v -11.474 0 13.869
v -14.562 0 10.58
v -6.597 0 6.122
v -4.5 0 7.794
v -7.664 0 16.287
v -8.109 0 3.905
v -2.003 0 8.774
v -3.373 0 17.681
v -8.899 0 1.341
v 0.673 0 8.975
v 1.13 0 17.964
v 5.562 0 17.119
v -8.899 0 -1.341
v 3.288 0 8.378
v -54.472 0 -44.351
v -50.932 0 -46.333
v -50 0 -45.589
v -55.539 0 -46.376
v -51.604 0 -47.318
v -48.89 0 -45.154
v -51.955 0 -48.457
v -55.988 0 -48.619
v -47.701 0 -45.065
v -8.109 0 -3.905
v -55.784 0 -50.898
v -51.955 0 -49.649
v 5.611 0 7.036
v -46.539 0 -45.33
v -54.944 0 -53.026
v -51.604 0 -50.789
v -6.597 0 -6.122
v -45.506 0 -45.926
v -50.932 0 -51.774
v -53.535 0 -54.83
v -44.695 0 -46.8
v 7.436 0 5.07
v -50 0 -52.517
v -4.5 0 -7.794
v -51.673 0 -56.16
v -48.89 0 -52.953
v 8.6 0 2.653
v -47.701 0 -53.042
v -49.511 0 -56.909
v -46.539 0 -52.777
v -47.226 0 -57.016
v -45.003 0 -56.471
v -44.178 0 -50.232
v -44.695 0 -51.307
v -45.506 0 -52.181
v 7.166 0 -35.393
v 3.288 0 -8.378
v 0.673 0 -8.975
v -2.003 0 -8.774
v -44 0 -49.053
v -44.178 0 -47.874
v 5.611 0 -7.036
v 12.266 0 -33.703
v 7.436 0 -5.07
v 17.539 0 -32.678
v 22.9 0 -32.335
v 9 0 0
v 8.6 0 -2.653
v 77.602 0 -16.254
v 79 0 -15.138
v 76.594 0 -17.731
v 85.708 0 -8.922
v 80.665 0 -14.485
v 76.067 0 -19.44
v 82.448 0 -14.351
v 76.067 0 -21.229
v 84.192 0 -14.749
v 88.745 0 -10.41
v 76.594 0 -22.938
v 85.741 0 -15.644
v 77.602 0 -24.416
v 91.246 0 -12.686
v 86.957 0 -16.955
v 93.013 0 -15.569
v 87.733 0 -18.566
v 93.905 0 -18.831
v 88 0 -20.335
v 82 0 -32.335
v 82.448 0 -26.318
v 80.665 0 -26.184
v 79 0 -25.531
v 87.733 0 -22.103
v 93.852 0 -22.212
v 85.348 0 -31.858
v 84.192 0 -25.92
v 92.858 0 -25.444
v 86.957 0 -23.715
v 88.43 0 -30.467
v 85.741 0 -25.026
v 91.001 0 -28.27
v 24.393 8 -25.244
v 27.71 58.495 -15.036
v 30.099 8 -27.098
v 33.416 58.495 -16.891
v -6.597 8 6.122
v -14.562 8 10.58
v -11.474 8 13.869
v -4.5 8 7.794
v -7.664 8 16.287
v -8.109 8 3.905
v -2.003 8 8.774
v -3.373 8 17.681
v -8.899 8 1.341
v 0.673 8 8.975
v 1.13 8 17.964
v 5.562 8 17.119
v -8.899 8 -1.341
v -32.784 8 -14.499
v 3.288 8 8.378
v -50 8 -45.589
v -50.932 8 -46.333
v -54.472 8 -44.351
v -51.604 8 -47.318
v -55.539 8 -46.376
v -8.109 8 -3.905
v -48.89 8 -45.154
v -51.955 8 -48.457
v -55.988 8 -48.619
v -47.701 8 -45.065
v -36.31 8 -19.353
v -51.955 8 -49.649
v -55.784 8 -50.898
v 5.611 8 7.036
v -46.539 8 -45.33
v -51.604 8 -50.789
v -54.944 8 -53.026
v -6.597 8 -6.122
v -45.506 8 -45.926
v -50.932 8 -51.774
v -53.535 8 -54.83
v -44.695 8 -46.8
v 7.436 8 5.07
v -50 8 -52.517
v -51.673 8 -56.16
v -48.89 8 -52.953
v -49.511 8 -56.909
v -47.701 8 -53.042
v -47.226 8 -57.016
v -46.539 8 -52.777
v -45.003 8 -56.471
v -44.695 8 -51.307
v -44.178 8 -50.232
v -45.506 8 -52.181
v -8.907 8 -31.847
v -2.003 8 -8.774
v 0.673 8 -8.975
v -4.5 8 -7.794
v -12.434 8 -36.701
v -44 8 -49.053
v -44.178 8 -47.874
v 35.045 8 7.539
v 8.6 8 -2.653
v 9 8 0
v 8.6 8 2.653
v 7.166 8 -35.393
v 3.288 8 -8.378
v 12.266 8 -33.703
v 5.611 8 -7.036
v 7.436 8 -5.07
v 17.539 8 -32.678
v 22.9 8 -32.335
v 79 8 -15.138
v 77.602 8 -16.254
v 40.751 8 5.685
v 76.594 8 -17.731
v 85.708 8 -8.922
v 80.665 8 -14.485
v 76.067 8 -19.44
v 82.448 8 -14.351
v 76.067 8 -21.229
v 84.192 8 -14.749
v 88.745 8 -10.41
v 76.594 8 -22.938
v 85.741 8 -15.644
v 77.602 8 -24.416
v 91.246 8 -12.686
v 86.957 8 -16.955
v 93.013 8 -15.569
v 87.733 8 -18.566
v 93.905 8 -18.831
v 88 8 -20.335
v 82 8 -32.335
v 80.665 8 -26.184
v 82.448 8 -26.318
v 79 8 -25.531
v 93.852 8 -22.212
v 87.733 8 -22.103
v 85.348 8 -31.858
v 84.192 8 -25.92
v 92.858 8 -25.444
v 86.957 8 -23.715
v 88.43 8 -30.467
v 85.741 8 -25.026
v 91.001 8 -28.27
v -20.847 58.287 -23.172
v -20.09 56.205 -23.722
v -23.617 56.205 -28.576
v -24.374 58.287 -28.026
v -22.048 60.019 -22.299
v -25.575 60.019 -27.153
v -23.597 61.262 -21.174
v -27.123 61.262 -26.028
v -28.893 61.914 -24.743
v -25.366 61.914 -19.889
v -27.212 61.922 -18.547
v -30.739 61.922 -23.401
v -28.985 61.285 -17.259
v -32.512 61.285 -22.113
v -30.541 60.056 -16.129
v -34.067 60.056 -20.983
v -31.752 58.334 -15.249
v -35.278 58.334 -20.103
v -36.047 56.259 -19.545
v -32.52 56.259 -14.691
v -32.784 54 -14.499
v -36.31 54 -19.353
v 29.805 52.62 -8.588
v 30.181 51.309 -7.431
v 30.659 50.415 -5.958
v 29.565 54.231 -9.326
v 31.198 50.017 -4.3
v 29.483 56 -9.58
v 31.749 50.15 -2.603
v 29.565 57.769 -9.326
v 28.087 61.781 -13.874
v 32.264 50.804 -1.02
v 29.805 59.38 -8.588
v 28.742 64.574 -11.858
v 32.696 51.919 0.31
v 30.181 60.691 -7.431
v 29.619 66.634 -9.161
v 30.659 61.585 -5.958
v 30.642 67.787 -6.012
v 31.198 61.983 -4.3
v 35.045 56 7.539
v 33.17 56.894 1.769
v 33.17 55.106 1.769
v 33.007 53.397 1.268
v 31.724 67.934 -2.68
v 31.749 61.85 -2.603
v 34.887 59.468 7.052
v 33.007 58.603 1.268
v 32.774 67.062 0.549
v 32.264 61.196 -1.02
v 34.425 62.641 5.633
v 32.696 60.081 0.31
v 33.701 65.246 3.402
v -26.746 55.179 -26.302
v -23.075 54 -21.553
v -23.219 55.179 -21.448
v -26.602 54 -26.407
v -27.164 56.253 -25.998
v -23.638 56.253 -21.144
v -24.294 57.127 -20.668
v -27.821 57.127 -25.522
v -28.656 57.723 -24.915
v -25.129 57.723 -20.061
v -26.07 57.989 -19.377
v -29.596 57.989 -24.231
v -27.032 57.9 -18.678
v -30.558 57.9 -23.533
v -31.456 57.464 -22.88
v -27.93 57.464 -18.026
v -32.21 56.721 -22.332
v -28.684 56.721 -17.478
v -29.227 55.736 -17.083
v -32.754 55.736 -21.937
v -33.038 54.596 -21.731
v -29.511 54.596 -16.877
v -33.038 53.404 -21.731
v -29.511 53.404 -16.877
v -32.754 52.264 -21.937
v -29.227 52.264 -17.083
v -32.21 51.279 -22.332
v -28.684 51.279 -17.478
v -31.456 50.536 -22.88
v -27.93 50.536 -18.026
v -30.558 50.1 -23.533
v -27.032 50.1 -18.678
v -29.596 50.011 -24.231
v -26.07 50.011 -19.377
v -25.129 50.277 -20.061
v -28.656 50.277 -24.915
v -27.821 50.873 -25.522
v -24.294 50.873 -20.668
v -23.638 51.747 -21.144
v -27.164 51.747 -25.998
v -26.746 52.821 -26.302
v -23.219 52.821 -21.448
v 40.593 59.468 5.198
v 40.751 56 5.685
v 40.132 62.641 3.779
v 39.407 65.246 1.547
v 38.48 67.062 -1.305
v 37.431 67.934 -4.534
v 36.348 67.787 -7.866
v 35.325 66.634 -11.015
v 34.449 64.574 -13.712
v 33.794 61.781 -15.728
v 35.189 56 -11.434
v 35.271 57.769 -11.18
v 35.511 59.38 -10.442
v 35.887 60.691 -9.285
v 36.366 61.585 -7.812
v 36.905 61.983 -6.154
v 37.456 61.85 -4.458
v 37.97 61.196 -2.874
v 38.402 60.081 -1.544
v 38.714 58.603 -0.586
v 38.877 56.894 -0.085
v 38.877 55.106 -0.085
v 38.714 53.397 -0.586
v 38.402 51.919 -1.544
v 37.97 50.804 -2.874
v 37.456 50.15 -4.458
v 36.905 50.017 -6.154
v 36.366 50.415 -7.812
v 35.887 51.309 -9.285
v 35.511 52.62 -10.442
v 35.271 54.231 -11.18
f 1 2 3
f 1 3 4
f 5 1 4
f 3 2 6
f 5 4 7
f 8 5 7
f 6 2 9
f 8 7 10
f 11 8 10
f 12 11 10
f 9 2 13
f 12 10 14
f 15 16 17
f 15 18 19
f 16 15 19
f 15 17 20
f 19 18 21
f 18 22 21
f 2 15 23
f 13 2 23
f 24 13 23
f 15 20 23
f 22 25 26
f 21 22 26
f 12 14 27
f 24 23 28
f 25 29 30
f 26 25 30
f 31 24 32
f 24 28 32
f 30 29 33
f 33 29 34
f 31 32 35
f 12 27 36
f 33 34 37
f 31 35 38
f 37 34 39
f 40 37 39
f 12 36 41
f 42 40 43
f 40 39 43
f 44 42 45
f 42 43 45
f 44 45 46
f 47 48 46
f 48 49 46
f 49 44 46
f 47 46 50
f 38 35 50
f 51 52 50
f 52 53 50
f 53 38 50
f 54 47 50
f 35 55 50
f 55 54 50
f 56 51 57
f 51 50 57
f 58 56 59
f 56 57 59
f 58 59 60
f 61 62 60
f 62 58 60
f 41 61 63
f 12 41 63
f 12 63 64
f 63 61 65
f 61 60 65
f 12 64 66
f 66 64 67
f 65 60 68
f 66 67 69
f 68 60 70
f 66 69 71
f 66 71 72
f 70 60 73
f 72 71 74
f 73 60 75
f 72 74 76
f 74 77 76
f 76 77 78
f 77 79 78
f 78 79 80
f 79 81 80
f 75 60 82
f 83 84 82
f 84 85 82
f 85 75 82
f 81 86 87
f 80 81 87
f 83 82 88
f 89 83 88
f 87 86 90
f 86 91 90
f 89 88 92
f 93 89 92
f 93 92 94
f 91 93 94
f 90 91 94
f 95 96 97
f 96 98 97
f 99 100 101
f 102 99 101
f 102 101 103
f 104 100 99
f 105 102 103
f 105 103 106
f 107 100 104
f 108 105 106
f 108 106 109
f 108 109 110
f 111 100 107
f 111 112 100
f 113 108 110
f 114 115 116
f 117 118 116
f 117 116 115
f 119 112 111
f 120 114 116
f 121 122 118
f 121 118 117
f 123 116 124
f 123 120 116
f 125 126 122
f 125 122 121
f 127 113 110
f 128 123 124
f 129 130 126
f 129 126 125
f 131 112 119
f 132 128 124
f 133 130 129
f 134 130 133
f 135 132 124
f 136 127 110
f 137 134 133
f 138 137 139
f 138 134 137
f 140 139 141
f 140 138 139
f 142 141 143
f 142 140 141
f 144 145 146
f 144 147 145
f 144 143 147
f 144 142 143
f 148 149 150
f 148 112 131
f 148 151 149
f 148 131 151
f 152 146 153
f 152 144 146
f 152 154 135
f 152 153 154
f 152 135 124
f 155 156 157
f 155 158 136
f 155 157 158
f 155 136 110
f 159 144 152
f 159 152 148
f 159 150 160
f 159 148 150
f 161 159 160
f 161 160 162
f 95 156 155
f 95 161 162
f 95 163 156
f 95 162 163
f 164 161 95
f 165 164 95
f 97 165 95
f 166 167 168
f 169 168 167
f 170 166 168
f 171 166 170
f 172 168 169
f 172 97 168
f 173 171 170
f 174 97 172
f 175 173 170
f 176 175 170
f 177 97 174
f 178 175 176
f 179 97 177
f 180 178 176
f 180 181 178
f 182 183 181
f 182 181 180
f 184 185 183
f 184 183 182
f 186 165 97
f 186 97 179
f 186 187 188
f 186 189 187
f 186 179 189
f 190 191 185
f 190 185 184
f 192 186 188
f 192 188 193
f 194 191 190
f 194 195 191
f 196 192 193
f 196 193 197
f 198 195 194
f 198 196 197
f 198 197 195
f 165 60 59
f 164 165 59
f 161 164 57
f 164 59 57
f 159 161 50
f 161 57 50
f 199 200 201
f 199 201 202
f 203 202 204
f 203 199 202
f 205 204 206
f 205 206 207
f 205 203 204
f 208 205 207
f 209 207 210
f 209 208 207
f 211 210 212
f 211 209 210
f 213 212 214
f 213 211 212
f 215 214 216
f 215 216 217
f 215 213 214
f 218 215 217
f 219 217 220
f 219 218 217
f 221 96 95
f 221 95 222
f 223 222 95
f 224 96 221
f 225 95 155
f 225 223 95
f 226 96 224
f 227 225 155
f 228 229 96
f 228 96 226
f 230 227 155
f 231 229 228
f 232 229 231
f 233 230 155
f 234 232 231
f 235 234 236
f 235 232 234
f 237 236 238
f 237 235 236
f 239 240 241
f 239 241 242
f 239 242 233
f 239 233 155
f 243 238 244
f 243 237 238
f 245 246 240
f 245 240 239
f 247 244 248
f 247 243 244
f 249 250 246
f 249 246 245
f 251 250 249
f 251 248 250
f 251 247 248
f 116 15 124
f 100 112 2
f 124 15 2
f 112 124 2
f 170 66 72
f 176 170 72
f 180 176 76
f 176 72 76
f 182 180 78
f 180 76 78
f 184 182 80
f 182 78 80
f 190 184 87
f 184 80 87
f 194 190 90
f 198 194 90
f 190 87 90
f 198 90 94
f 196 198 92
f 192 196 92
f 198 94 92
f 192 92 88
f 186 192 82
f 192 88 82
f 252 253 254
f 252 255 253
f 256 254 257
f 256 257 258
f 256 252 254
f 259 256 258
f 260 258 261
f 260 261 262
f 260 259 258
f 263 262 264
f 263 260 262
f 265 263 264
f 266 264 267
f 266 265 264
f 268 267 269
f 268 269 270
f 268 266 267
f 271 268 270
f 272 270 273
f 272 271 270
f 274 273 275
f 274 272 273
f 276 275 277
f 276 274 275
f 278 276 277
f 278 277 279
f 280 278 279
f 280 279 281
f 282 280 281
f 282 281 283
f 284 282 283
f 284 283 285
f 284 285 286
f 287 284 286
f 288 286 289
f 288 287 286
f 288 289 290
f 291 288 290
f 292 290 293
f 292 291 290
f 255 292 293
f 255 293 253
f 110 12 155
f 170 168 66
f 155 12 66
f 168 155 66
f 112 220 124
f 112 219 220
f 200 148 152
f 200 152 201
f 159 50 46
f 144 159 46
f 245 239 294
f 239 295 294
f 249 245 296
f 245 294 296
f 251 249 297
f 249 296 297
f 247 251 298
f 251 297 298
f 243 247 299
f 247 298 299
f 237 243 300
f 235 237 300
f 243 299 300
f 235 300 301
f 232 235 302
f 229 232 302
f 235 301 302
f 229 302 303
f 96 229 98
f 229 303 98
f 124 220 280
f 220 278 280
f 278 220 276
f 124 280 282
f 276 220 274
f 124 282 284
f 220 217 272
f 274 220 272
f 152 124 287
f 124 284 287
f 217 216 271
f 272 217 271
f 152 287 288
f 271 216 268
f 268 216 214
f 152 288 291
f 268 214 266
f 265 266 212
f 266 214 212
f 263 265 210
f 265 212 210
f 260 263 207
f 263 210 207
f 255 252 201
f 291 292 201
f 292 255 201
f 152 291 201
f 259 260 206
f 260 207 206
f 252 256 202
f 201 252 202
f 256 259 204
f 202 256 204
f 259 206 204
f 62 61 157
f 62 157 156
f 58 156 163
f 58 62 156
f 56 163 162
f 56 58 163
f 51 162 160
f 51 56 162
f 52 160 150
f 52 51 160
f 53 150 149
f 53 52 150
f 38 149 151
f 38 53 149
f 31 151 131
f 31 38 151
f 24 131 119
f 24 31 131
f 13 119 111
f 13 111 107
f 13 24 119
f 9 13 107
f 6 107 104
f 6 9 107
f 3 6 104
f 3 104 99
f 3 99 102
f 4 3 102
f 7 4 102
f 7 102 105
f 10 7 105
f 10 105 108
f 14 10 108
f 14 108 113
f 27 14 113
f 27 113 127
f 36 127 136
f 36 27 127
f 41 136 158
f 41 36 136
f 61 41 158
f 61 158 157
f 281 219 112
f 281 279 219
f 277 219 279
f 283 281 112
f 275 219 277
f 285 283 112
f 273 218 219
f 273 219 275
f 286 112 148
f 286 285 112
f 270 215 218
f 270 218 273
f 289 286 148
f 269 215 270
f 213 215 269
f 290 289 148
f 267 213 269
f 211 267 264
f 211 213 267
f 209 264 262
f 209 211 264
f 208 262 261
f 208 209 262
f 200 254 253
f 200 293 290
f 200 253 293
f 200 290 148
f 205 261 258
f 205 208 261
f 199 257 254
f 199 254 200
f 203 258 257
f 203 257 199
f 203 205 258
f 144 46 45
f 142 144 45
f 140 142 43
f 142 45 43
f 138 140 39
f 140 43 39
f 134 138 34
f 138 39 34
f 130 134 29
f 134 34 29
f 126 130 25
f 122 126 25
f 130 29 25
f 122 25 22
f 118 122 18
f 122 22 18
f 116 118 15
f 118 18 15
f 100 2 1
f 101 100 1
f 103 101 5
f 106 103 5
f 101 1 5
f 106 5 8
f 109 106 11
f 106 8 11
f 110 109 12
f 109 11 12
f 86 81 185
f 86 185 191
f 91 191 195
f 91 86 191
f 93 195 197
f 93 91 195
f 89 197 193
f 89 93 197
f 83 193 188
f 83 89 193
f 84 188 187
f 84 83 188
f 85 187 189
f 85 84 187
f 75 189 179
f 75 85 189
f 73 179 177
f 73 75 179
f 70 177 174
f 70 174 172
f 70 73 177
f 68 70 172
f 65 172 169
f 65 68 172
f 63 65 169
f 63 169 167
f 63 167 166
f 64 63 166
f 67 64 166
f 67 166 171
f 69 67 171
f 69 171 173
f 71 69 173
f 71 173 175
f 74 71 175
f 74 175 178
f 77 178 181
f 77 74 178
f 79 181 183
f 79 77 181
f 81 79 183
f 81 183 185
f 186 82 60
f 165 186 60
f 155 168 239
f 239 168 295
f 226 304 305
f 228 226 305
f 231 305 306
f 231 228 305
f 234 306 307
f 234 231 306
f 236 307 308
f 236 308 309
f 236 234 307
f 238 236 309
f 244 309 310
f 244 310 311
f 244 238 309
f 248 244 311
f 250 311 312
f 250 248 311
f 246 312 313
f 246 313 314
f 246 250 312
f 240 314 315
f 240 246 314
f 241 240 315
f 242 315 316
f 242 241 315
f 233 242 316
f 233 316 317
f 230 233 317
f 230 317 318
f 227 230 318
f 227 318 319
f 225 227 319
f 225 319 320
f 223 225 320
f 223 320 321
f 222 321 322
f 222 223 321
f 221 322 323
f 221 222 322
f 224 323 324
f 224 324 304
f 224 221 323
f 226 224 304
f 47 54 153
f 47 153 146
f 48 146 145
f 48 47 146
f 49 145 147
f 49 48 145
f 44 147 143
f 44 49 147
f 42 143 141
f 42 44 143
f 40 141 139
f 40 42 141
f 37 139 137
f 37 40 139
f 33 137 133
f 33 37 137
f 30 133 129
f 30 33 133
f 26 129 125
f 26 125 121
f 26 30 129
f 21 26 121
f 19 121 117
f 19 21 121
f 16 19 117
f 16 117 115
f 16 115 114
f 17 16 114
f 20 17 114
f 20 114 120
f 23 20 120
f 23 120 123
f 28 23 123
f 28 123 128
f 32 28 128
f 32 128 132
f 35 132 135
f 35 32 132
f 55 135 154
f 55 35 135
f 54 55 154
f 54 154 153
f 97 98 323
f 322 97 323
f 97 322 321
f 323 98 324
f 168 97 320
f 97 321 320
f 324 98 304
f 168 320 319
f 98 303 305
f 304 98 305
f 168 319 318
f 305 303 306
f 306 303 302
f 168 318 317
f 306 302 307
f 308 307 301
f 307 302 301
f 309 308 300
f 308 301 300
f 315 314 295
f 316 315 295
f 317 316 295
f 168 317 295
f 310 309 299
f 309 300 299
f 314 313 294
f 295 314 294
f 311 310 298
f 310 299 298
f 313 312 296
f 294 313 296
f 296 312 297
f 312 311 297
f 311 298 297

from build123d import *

# Parameters (mm, degrees)
SKETCH1_R           = 9
SKETCH1_R_2         = 6
SKETCH1_R_3         = 4
BOSS_EXTRUDE1_DEPTH = 8
SKETCH3_R           = 4
BOSS_EXTRUDE2_DEPTH = 3
SKETCH4_R           = 6
BOSS_EXTRUDE3_DEPTH = 3


with BuildPart() as part:
    # Sketch1 → Boss-Extrude1 (new body)
    with BuildSketch(Plane(origin=(0, 0, 0), x_dir=(1, 0, 0), z_dir=(0, 1, 0))):
        with BuildLine():
            Line((82, 32.334641746), (22.899881176, 32.334641746))
            ThreePointArc((22.899881176, 32.334641746), (14.88590337, 33.106300041), (7.166404253, 35.392919854))
            Line((7.166404253, 35.392919854), (-45.003147253, 56.470786852))
            ThreePointArc((-45.003147253, 56.470786852), (-54.304086029, 53.978607818), (-54.472135955, 44.351033997))
            Line((-54.472135955, 44.351033997), (-14.562305899, -10.580134541))
            ThreePointArc((-14.562305899, -10.580134541), (-5.562305899, -17.119017293), (5.562305899, -17.119017293))
            Line((5.562305899, -17.119017293), (85.708203932, 8.92196355))
            ThreePointArc((85.708203932, 8.92196355), (93.852260087, 22.211855326), (82, 32.334641746))
        make_face()
        Circle(SKETCH1_R, mode=Mode.SUBTRACT)
        with Locations((82, 20.334641746)):
            Circle(SKETCH1_R_2, mode=Mode.SUBTRACT)
        with Locations((-48, 49.053316016)):
            Circle(SKETCH1_R_3, mode=Mode.SUBTRACT)
    extrude(amount=BOSS_EXTRUDE1_DEPTH)

    # Sketch3 → Boss-Extrude2 (add, symmetric)
    with BuildSketch(Plane(origin=(-19.984698578, 0, -27.506577809), x_dir=(0.809016994, 0, -0.587785252), z_dir=(0.587785252, 0, 0.809016994))):
        with BuildLine():
            Line((-18, 8), (11.512683232, 8))
            Line((11.512683232, 8), (-2.309906432, 56.205098847))
            ThreePointArc((-2.309906432, 56.205098847), (-11.113384808, 61.92214455), (-18, 54))
            Line((-18, 54), (-18, 8))
        make_face()
        with Locations((-10, 54)):
            Circle(SKETCH3_R, mode=Mode.SUBTRACT)
    extrude(amount=BOSS_EXTRUDE2_DEPTH, both=True)

    # Sketch4 → Boss-Extrude3 (add, symmetric)
    with BuildSketch(Plane(origin=(32.335921554, 0, -10.506577809), x_dir=(-0.309016994, 0, -0.951056516), z_dir=(0.951056516, 0, -0.309016994))):
        with BuildLine():
            Line((-18, 8), (-18, 56))
            ThreePointArc((-18, 56), (-7.254341559, 67.934262744), (5.737771209, 58.49494029))
            Line((5.737771209, 58.49494029), (16.470802099, 8))
            Line((16.470802099, 8), (-18, 8))
        make_face()
        with Locations((-6, 56)):
            Circle(SKETCH4_R, mode=Mode.SUBTRACT)
    extrude(amount=BOSS_EXTRUDE3_DEPTH, both=True)


solid = part.part
